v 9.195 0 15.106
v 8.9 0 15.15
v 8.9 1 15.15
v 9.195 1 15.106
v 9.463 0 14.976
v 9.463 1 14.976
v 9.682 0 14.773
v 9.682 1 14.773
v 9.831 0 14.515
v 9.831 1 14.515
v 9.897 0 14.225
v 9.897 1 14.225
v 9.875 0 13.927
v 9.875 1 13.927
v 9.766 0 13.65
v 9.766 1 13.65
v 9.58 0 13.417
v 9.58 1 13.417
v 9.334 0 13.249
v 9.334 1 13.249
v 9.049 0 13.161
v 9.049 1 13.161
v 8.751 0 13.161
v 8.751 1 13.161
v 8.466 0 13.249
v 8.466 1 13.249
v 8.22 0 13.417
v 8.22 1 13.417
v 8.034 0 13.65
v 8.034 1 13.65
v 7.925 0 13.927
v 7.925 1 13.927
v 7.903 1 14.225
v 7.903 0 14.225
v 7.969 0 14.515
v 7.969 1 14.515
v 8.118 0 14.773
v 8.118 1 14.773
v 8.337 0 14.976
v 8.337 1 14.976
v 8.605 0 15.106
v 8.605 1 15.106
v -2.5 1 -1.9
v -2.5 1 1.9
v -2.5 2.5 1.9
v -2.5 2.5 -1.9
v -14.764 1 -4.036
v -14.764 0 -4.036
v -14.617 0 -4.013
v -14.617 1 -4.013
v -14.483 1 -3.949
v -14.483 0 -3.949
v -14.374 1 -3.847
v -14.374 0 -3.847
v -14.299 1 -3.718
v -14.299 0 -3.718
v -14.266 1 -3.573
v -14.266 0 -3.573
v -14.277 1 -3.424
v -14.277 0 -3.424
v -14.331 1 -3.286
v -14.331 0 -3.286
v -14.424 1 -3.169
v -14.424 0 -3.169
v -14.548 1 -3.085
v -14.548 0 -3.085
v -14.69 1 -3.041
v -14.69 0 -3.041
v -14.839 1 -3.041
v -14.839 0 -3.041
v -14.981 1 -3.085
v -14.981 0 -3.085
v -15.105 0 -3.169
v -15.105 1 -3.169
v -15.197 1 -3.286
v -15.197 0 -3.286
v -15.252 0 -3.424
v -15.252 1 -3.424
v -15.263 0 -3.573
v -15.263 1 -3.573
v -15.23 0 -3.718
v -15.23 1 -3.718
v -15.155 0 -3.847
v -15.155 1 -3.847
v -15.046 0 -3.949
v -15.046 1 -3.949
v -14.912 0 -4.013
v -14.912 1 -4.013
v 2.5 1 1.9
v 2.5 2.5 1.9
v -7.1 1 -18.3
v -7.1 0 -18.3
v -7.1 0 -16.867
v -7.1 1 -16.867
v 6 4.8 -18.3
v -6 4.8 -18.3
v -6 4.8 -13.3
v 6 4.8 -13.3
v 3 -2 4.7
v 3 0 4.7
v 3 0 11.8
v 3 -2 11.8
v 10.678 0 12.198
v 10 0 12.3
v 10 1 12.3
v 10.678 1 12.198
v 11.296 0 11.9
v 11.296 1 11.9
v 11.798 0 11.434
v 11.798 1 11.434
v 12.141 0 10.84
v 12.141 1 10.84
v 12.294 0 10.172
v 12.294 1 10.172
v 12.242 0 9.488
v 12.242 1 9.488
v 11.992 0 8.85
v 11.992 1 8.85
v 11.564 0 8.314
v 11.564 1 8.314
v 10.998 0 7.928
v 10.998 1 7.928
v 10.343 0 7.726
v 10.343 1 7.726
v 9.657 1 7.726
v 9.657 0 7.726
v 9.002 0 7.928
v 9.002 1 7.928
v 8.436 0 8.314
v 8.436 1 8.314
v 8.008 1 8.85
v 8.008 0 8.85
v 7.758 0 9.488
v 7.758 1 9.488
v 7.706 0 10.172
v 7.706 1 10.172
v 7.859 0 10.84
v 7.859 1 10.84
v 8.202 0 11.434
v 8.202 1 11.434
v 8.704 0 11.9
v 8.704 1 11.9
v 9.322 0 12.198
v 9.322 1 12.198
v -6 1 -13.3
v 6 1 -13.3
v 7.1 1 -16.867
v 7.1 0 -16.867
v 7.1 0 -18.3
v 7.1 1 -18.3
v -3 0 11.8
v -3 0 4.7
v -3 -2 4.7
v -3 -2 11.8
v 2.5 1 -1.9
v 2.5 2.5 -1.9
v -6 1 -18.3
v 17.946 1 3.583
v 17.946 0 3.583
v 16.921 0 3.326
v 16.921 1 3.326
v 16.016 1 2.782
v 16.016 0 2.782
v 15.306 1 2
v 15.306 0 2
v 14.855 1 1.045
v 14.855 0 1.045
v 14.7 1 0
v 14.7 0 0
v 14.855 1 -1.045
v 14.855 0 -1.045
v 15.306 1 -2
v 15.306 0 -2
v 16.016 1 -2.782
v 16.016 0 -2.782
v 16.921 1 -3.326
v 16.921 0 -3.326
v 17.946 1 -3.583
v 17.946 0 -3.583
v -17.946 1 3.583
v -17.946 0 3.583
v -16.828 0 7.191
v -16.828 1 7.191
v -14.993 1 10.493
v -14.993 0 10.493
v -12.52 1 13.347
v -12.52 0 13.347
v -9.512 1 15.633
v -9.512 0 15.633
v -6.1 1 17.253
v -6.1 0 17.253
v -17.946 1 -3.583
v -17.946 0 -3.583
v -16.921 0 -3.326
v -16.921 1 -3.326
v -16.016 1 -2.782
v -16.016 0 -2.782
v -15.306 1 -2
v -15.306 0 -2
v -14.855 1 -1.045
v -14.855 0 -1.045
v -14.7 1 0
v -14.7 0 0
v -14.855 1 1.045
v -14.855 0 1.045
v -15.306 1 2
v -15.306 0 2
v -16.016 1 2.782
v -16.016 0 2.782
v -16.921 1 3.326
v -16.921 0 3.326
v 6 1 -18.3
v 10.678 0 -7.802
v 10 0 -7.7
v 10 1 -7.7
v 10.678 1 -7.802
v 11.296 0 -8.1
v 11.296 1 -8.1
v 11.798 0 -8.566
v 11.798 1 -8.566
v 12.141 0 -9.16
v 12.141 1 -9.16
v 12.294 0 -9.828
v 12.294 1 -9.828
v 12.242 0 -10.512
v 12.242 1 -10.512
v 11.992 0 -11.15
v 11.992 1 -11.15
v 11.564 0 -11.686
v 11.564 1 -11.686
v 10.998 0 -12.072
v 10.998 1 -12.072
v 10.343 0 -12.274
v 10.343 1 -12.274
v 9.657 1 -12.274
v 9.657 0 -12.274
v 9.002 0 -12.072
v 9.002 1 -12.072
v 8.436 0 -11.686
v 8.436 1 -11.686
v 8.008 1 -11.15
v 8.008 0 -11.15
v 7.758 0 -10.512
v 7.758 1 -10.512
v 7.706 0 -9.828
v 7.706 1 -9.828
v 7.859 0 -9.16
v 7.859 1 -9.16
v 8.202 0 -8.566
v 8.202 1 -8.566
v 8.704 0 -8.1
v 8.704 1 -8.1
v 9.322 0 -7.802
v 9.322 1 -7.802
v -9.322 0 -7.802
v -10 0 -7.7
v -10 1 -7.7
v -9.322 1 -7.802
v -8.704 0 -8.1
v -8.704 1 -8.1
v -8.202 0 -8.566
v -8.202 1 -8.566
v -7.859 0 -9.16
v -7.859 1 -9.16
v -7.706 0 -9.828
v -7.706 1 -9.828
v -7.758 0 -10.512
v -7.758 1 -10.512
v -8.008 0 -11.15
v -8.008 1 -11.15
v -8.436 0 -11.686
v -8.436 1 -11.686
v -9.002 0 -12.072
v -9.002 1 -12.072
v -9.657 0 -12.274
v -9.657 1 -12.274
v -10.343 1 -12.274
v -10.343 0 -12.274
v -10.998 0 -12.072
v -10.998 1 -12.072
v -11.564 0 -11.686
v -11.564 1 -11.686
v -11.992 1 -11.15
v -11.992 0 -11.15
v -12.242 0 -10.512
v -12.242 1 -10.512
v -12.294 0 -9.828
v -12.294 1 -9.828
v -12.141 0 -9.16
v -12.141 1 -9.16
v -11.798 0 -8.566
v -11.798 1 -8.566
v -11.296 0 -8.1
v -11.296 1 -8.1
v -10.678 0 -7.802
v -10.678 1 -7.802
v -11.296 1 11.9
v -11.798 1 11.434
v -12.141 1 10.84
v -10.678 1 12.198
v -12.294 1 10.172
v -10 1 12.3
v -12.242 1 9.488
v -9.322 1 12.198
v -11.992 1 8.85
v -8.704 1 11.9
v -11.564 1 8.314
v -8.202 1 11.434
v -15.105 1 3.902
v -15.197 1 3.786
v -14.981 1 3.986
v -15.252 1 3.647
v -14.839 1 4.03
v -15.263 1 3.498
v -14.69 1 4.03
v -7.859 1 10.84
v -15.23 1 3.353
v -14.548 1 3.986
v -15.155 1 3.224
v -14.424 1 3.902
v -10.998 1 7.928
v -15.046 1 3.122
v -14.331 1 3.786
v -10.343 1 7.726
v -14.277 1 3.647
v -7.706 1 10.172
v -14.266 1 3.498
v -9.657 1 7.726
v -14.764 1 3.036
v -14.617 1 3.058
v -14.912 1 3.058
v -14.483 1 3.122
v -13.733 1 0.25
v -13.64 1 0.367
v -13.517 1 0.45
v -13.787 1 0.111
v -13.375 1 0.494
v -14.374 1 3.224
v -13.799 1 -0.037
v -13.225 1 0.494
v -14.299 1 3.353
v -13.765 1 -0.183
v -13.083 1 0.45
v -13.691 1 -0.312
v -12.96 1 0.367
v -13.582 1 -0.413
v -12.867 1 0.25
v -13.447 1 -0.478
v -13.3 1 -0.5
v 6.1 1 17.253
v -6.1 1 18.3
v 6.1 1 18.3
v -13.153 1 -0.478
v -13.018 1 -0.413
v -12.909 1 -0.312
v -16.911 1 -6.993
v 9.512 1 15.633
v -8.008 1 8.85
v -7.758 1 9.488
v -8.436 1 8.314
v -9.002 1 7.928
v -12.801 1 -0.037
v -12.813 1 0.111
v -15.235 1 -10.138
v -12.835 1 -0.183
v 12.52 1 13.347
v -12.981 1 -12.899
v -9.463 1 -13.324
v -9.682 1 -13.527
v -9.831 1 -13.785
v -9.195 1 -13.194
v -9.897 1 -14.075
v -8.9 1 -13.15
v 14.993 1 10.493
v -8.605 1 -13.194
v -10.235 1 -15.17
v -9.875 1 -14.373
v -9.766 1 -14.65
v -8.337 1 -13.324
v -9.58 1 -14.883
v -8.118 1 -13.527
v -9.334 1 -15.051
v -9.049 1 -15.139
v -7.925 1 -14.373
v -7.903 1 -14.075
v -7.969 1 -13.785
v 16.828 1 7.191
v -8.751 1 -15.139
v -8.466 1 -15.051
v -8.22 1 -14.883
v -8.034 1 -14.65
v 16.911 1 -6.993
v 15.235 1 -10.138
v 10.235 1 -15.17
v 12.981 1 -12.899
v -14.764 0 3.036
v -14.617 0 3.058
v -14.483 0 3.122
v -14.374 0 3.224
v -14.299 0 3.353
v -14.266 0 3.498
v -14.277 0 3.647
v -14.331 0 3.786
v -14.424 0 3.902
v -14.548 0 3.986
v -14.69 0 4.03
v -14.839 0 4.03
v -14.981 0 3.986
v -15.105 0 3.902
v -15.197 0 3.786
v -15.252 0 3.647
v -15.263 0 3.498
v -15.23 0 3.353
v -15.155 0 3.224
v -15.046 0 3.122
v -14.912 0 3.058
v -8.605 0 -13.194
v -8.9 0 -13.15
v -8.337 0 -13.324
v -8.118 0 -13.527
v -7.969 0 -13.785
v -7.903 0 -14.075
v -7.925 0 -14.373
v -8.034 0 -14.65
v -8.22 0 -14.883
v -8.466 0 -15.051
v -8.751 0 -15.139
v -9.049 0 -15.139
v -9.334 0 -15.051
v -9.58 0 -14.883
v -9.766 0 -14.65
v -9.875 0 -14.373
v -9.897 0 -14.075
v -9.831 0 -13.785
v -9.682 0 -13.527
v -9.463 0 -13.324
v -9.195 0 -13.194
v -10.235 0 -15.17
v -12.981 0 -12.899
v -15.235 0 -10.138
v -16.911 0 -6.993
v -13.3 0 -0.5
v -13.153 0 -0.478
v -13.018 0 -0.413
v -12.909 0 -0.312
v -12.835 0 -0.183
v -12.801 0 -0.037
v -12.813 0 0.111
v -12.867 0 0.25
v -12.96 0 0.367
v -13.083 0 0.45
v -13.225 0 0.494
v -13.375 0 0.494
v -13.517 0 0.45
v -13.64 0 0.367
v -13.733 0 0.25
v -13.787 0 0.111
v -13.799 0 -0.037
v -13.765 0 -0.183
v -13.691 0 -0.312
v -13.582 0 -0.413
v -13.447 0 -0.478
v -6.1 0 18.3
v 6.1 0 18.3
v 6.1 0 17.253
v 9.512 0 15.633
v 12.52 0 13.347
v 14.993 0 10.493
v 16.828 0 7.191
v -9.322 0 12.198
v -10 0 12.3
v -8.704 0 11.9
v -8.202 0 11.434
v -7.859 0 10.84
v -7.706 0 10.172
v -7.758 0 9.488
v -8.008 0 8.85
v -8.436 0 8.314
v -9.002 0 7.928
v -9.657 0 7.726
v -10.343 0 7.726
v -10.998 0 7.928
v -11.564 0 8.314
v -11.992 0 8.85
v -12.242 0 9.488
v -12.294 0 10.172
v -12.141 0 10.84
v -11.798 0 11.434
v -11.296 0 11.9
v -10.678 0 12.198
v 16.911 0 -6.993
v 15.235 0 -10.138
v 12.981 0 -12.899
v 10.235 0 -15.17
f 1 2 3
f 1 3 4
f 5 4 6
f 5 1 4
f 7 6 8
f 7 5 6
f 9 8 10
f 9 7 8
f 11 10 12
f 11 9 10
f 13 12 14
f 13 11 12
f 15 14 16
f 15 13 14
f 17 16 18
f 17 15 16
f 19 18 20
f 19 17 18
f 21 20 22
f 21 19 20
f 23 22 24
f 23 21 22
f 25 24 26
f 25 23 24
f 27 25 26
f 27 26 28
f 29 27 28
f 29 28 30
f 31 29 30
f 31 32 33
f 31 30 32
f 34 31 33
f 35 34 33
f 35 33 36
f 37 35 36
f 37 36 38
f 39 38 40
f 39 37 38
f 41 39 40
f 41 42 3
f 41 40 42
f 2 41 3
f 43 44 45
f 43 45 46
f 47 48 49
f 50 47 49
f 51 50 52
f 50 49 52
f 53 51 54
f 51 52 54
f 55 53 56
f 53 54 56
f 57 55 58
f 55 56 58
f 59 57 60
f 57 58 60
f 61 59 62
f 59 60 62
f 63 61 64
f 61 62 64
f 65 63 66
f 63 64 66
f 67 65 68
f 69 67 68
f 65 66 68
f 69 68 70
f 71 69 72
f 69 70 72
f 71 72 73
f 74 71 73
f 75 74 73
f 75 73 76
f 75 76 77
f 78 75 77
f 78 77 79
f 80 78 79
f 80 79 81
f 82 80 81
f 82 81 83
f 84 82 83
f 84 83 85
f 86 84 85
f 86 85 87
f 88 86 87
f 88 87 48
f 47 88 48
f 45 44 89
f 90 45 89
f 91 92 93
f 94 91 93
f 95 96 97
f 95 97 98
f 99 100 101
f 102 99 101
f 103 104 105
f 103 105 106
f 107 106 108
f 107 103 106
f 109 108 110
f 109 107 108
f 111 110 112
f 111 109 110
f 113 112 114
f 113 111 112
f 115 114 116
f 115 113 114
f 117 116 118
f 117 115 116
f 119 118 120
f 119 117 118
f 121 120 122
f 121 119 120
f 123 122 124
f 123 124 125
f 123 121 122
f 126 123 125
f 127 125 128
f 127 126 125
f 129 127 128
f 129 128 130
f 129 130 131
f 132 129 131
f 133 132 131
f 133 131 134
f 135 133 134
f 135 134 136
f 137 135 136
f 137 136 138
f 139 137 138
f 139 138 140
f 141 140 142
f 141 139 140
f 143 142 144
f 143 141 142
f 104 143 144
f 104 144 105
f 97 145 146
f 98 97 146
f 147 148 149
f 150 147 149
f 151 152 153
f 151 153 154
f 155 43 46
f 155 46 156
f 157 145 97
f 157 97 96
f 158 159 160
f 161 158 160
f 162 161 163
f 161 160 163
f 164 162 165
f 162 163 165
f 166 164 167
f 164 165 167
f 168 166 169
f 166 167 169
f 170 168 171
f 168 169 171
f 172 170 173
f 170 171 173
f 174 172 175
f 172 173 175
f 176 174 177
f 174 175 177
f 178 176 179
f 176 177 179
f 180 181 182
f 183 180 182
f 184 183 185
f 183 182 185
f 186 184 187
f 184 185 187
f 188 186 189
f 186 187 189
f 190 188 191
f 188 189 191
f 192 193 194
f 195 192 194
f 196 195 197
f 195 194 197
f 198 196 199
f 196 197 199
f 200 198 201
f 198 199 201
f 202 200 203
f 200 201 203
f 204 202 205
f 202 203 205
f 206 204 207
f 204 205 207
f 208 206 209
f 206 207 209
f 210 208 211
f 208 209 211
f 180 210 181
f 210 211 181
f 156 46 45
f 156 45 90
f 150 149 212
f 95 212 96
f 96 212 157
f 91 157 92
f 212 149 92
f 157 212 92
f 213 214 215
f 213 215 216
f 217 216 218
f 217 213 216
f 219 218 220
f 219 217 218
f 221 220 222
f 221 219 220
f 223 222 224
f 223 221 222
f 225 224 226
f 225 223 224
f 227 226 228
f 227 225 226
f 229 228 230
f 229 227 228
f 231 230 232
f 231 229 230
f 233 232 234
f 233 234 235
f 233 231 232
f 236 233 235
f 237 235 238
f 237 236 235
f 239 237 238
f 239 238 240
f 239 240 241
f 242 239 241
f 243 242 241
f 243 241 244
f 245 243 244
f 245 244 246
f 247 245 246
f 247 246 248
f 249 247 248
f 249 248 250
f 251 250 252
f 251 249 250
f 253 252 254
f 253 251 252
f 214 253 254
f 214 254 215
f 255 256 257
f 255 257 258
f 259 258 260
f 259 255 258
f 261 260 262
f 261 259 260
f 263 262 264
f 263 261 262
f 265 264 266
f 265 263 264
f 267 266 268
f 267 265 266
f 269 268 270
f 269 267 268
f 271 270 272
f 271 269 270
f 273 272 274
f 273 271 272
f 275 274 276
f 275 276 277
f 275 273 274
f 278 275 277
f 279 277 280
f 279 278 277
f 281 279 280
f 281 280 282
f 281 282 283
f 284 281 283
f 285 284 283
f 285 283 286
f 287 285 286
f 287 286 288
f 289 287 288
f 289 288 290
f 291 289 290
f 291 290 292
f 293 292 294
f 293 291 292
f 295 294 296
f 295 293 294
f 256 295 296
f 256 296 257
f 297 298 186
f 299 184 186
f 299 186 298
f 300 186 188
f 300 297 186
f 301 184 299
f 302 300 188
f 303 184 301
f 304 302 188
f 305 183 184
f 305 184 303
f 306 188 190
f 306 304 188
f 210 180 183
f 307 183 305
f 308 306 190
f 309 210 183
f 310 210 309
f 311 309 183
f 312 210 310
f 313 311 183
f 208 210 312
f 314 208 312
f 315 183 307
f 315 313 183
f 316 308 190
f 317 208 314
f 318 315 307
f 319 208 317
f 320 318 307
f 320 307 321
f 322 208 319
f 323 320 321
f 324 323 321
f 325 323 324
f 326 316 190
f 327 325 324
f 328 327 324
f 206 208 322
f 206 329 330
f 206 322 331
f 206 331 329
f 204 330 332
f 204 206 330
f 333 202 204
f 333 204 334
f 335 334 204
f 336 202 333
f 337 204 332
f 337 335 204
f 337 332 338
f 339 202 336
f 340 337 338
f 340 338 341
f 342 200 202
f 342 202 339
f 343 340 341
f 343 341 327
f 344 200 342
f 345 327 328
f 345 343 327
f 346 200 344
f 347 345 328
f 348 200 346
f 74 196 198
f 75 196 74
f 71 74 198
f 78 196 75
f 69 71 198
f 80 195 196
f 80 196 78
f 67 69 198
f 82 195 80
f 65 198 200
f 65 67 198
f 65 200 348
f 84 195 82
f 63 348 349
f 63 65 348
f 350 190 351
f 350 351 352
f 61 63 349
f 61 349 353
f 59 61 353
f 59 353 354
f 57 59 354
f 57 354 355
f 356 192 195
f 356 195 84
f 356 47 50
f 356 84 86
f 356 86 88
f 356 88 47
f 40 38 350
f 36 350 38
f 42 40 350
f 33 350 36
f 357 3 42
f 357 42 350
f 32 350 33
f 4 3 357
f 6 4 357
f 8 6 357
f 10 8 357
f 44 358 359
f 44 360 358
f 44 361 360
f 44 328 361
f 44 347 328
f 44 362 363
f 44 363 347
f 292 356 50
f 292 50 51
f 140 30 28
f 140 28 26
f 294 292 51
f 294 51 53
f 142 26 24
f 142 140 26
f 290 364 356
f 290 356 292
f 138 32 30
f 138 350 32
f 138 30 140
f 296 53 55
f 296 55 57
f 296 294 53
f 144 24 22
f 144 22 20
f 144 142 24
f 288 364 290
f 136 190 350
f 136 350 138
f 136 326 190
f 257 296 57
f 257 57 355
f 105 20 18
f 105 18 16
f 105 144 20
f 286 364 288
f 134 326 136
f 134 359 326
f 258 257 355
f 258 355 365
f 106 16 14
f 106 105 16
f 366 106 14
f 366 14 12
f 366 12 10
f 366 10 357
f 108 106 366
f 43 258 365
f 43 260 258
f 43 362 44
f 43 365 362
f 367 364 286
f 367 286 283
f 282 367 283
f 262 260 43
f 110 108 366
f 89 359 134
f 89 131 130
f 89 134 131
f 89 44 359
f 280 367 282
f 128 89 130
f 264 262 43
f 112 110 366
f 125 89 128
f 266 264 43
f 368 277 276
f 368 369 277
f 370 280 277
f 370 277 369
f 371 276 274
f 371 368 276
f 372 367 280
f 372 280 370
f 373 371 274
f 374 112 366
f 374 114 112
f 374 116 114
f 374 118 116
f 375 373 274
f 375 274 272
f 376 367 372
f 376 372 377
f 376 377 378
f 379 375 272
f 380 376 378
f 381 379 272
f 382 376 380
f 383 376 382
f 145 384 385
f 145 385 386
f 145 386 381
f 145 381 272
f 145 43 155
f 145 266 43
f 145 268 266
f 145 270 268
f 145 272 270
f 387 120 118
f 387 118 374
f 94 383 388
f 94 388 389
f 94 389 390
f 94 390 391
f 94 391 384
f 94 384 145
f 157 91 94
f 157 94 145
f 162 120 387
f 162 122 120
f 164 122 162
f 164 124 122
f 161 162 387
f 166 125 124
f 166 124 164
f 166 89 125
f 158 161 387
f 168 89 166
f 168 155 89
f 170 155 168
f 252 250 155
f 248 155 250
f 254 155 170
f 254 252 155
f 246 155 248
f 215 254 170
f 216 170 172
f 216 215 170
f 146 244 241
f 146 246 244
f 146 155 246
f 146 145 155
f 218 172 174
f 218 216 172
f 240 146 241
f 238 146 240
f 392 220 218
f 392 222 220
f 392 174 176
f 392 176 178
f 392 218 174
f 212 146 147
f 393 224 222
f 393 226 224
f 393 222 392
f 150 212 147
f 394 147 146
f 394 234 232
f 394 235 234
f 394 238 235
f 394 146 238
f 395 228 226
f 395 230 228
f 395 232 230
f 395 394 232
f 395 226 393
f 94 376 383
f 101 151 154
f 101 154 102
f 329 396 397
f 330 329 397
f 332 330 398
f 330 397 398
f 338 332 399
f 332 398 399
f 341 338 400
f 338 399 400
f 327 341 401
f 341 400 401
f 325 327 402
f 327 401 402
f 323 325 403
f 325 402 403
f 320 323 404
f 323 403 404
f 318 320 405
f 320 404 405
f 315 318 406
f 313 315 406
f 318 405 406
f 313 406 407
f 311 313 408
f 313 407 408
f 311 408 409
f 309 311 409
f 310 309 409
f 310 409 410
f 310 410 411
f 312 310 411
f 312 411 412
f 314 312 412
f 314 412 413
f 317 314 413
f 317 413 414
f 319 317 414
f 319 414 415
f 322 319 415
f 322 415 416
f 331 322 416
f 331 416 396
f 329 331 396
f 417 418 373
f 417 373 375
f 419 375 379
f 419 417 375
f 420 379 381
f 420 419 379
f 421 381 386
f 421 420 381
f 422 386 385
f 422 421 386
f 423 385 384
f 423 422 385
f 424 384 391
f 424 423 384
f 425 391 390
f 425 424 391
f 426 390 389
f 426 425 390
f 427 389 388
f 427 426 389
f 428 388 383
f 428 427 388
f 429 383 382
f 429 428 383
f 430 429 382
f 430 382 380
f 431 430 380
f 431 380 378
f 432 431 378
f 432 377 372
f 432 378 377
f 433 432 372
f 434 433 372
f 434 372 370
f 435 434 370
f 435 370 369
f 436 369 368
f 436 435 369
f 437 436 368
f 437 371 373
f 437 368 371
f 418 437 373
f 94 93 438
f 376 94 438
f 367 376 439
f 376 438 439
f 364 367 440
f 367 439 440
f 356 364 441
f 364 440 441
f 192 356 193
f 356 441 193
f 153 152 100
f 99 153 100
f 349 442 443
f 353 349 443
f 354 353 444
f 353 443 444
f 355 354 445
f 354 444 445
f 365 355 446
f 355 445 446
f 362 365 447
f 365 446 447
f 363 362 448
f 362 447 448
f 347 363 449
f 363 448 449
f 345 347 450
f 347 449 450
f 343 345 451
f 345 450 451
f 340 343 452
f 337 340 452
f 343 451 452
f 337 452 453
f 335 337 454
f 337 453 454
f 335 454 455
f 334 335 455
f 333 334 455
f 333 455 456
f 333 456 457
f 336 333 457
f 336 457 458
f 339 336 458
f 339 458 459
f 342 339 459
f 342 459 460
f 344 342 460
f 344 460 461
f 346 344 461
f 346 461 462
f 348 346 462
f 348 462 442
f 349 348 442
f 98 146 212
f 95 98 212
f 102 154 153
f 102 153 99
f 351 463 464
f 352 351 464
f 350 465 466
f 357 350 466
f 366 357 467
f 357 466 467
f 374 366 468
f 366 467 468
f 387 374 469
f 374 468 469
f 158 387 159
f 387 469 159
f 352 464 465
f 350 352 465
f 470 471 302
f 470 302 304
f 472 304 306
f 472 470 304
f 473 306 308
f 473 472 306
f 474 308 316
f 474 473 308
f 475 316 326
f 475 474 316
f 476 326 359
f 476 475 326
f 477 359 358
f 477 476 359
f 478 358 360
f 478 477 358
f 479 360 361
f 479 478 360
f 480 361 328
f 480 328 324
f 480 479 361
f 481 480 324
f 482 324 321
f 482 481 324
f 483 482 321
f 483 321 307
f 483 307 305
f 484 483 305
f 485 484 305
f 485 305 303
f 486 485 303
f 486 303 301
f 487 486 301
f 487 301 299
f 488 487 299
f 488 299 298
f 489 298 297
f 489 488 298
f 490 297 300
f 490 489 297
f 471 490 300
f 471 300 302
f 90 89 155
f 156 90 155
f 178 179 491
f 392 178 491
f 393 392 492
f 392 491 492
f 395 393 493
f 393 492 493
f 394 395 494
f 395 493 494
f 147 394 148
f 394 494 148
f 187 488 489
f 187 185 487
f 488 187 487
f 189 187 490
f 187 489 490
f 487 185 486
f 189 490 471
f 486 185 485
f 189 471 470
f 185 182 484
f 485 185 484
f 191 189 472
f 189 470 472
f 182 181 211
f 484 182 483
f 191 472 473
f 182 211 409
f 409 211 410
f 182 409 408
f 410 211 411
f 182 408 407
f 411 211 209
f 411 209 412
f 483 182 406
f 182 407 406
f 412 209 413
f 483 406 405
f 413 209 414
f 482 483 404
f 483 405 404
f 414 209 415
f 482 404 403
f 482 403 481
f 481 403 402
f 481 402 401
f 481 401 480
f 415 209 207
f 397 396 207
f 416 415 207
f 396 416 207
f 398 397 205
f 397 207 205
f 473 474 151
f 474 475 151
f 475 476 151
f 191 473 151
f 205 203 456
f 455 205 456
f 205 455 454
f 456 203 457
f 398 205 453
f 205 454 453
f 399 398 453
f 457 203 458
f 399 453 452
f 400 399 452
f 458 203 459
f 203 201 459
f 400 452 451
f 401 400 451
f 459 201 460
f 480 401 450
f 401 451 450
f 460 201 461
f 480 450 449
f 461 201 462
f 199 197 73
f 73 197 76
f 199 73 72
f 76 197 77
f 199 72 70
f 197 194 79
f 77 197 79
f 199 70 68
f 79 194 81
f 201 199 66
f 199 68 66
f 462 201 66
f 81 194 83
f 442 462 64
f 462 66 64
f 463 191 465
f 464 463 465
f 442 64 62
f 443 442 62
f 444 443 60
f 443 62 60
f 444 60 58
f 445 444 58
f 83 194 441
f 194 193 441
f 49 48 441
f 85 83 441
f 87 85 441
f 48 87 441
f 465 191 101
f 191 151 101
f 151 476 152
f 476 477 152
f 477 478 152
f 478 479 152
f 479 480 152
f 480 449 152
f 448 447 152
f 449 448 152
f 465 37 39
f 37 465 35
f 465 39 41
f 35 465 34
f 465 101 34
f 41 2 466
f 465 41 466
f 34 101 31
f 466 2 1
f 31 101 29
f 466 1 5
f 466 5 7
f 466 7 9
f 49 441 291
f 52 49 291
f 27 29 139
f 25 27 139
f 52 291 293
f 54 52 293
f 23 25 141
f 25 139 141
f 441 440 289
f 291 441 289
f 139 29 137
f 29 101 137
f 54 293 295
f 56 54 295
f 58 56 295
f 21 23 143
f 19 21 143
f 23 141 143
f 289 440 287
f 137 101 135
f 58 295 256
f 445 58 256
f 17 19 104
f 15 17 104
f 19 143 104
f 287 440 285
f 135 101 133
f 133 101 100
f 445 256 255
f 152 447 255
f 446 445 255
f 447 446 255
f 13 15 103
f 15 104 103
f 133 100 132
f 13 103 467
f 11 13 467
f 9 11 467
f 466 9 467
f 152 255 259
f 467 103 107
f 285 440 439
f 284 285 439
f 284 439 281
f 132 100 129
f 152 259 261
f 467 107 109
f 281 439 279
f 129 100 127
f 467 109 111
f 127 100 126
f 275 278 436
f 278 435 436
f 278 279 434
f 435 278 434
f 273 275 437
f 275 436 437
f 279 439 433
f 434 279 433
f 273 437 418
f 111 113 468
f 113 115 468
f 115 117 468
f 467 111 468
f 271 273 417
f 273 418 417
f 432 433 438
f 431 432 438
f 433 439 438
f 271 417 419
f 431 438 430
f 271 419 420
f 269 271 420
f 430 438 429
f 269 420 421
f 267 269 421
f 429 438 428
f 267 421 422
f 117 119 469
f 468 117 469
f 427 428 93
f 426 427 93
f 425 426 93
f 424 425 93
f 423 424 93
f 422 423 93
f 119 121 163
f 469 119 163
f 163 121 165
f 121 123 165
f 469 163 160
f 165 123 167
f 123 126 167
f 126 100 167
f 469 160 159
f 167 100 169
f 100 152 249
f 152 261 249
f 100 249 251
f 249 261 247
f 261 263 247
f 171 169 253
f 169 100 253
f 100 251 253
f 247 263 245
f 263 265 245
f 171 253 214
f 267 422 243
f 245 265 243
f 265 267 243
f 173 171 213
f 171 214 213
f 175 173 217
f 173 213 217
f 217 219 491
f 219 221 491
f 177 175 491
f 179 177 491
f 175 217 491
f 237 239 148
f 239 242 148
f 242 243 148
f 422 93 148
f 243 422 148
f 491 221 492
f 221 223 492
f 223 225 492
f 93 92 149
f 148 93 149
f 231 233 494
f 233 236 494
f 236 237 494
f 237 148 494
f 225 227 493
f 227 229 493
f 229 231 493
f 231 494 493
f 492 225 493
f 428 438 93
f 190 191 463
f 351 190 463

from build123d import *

# Parameters (mm, degrees)
SKETCH1_R           = 2.3
EXTRUDE1_DEPTH      = 1
SKETCH2_W           = 12
SKETCH2_H           = 5
EXTRUDE2_DEPTH      = 3.8
SKETCH3_W           = 5
SKETCH3_H           = 3.8
EXTRUDE3_DEPTH      = 1.5
SKETCH4_W           = 6
SKETCH4_H           = 7.1
EXTRUDE4_DEPTH      = 2
EXTRUDE5_DEPTH      = 26.91110545
EXTRUDE5_DEPTH_BACK = 26.91110545
SKETCH5_R           = 1
SKETCH6_R           = 0.5
EXTRUDE6_DEPTH      = 27.076529402


with BuildPart() as part:
    # Sketch1 → Extrude1 (new body)
    with BuildSketch(Plane(origin=(0, 0, 0), x_dir=(1, 0, 0), z_dir=(0, 1, 0))):
        with BuildLine():
            Line((-7.1, 18.3), (-7.1, 16.866534914))
            ThreePointArc((-7.1, 16.866534914), (-14.175345058, 11.573659425), (-17.945901639, 3.582543001))
            ThreePointArc((-17.945901639, 3.582543001), (-14.7, 0), (-17.945901639, -3.582543001))
            ThreePointArc((-17.945901639, -3.582543001), (-13.830201246, -11.983969855), (-6.1, -17.253405461))
            Line((-6.1, -17.253405461), (-6.1, -18.3))
            Line((-6.1, -18.3), (6.1, -18.3))
            Line((6.1, -18.3), (6.1, -17.253405461))
            ThreePointArc((6.1, -17.253405461), (13.830201246, -11.983969855), (17.945901639, -3.582543001))
            ThreePointArc((17.945901639, -3.582543001), (14.7, 0), (17.945901639, 3.582543001))
            ThreePointArc((17.945901639, 3.582543001), (14.175345058, 11.573659425), (7.1, 16.866534914))
            Line((7.1, 16.866534914), (7.1, 18.3))
            Line((7.1, 18.3), (-7.1, 18.3))
        make_face()
        with Locations((-10, 10)):
            Circle(SKETCH1_R, mode=Mode.SUBTRACT)
        with Locations((10, 10)):
            Circle(SKETCH1_R, mode=Mode.SUBTRACT)
        with Locations((10, -10)):
            Circle(SKETCH1_R, mode=Mode.SUBTRACT)
        with Locations((-10, -10)):
            Circle(SKETCH1_R, mode=Mode.SUBTRACT)
    extrude(amount=EXTRUDE1_DEPTH)

    # Sketch2 → Extrude2 (add)
    with BuildSketch(Plane(origin=(0, 1, 0), x_dir=(1, 0, 0), z_dir=(0, 1, 0))):
        with Locations((0, 15.8)):
            Rectangle(SKETCH2_W, SKETCH2_H)
    extrude(amount=EXTRUDE2_DEPTH)

    # Sketch3 → Extrude3 (add)
    with BuildSketch(Plane(origin=(0, 1, 0), x_dir=(1, 0, 0), z_dir=(0, 1, 0))):
        Rectangle(SKETCH3_W, SKETCH3_H)
    extrude(amount=EXTRUDE3_DEPTH)

    # Sketch4 → Extrude4 (add)
    with BuildSketch(Plane.XZ):
        with Locations((0, 8.25)):
            Rectangle(SKETCH4_W, SKETCH4_H)
    extrude(amount=EXTRUDE4_DEPTH)

    # Sketch5 → Extrude5 (cut, two sides: drawn at the far end of the back side and taken through both)
    with BuildSketch(Plane(origin=(0, 1, 0), x_dir=(1, 0, 0), z_dir=(0, 1, 0)).offset(-EXTRUDE5_DEPTH_BACK)):
        with Locations((-8.9, 14.15)):
            Circle(SKETCH5_R)
        with Locations((8.9, -14.15)):
            Circle(SKETCH5_R)
    extrude(amount=EXTRUDE5_DEPTH + EXTRUDE5_DEPTH_BACK, mode=Mode.SUBTRACT)

    # Sketch6 → Extrude6 (cut, through all)
    with BuildSketch(Plane.XZ):
        with Locations((-13.3, 0)):
            Circle(SKETCH6_R)
        with Locations((-14.764466094, 3.535533906)):
            Circle(SKETCH6_R)
        with Locations((-14.764466094, -3.535533906)):
            Circle(SKETCH6_R)
    extrude(amount=-EXTRUDE6_DEPTH, mode=Mode.SUBTRACT)


solid = part.part
